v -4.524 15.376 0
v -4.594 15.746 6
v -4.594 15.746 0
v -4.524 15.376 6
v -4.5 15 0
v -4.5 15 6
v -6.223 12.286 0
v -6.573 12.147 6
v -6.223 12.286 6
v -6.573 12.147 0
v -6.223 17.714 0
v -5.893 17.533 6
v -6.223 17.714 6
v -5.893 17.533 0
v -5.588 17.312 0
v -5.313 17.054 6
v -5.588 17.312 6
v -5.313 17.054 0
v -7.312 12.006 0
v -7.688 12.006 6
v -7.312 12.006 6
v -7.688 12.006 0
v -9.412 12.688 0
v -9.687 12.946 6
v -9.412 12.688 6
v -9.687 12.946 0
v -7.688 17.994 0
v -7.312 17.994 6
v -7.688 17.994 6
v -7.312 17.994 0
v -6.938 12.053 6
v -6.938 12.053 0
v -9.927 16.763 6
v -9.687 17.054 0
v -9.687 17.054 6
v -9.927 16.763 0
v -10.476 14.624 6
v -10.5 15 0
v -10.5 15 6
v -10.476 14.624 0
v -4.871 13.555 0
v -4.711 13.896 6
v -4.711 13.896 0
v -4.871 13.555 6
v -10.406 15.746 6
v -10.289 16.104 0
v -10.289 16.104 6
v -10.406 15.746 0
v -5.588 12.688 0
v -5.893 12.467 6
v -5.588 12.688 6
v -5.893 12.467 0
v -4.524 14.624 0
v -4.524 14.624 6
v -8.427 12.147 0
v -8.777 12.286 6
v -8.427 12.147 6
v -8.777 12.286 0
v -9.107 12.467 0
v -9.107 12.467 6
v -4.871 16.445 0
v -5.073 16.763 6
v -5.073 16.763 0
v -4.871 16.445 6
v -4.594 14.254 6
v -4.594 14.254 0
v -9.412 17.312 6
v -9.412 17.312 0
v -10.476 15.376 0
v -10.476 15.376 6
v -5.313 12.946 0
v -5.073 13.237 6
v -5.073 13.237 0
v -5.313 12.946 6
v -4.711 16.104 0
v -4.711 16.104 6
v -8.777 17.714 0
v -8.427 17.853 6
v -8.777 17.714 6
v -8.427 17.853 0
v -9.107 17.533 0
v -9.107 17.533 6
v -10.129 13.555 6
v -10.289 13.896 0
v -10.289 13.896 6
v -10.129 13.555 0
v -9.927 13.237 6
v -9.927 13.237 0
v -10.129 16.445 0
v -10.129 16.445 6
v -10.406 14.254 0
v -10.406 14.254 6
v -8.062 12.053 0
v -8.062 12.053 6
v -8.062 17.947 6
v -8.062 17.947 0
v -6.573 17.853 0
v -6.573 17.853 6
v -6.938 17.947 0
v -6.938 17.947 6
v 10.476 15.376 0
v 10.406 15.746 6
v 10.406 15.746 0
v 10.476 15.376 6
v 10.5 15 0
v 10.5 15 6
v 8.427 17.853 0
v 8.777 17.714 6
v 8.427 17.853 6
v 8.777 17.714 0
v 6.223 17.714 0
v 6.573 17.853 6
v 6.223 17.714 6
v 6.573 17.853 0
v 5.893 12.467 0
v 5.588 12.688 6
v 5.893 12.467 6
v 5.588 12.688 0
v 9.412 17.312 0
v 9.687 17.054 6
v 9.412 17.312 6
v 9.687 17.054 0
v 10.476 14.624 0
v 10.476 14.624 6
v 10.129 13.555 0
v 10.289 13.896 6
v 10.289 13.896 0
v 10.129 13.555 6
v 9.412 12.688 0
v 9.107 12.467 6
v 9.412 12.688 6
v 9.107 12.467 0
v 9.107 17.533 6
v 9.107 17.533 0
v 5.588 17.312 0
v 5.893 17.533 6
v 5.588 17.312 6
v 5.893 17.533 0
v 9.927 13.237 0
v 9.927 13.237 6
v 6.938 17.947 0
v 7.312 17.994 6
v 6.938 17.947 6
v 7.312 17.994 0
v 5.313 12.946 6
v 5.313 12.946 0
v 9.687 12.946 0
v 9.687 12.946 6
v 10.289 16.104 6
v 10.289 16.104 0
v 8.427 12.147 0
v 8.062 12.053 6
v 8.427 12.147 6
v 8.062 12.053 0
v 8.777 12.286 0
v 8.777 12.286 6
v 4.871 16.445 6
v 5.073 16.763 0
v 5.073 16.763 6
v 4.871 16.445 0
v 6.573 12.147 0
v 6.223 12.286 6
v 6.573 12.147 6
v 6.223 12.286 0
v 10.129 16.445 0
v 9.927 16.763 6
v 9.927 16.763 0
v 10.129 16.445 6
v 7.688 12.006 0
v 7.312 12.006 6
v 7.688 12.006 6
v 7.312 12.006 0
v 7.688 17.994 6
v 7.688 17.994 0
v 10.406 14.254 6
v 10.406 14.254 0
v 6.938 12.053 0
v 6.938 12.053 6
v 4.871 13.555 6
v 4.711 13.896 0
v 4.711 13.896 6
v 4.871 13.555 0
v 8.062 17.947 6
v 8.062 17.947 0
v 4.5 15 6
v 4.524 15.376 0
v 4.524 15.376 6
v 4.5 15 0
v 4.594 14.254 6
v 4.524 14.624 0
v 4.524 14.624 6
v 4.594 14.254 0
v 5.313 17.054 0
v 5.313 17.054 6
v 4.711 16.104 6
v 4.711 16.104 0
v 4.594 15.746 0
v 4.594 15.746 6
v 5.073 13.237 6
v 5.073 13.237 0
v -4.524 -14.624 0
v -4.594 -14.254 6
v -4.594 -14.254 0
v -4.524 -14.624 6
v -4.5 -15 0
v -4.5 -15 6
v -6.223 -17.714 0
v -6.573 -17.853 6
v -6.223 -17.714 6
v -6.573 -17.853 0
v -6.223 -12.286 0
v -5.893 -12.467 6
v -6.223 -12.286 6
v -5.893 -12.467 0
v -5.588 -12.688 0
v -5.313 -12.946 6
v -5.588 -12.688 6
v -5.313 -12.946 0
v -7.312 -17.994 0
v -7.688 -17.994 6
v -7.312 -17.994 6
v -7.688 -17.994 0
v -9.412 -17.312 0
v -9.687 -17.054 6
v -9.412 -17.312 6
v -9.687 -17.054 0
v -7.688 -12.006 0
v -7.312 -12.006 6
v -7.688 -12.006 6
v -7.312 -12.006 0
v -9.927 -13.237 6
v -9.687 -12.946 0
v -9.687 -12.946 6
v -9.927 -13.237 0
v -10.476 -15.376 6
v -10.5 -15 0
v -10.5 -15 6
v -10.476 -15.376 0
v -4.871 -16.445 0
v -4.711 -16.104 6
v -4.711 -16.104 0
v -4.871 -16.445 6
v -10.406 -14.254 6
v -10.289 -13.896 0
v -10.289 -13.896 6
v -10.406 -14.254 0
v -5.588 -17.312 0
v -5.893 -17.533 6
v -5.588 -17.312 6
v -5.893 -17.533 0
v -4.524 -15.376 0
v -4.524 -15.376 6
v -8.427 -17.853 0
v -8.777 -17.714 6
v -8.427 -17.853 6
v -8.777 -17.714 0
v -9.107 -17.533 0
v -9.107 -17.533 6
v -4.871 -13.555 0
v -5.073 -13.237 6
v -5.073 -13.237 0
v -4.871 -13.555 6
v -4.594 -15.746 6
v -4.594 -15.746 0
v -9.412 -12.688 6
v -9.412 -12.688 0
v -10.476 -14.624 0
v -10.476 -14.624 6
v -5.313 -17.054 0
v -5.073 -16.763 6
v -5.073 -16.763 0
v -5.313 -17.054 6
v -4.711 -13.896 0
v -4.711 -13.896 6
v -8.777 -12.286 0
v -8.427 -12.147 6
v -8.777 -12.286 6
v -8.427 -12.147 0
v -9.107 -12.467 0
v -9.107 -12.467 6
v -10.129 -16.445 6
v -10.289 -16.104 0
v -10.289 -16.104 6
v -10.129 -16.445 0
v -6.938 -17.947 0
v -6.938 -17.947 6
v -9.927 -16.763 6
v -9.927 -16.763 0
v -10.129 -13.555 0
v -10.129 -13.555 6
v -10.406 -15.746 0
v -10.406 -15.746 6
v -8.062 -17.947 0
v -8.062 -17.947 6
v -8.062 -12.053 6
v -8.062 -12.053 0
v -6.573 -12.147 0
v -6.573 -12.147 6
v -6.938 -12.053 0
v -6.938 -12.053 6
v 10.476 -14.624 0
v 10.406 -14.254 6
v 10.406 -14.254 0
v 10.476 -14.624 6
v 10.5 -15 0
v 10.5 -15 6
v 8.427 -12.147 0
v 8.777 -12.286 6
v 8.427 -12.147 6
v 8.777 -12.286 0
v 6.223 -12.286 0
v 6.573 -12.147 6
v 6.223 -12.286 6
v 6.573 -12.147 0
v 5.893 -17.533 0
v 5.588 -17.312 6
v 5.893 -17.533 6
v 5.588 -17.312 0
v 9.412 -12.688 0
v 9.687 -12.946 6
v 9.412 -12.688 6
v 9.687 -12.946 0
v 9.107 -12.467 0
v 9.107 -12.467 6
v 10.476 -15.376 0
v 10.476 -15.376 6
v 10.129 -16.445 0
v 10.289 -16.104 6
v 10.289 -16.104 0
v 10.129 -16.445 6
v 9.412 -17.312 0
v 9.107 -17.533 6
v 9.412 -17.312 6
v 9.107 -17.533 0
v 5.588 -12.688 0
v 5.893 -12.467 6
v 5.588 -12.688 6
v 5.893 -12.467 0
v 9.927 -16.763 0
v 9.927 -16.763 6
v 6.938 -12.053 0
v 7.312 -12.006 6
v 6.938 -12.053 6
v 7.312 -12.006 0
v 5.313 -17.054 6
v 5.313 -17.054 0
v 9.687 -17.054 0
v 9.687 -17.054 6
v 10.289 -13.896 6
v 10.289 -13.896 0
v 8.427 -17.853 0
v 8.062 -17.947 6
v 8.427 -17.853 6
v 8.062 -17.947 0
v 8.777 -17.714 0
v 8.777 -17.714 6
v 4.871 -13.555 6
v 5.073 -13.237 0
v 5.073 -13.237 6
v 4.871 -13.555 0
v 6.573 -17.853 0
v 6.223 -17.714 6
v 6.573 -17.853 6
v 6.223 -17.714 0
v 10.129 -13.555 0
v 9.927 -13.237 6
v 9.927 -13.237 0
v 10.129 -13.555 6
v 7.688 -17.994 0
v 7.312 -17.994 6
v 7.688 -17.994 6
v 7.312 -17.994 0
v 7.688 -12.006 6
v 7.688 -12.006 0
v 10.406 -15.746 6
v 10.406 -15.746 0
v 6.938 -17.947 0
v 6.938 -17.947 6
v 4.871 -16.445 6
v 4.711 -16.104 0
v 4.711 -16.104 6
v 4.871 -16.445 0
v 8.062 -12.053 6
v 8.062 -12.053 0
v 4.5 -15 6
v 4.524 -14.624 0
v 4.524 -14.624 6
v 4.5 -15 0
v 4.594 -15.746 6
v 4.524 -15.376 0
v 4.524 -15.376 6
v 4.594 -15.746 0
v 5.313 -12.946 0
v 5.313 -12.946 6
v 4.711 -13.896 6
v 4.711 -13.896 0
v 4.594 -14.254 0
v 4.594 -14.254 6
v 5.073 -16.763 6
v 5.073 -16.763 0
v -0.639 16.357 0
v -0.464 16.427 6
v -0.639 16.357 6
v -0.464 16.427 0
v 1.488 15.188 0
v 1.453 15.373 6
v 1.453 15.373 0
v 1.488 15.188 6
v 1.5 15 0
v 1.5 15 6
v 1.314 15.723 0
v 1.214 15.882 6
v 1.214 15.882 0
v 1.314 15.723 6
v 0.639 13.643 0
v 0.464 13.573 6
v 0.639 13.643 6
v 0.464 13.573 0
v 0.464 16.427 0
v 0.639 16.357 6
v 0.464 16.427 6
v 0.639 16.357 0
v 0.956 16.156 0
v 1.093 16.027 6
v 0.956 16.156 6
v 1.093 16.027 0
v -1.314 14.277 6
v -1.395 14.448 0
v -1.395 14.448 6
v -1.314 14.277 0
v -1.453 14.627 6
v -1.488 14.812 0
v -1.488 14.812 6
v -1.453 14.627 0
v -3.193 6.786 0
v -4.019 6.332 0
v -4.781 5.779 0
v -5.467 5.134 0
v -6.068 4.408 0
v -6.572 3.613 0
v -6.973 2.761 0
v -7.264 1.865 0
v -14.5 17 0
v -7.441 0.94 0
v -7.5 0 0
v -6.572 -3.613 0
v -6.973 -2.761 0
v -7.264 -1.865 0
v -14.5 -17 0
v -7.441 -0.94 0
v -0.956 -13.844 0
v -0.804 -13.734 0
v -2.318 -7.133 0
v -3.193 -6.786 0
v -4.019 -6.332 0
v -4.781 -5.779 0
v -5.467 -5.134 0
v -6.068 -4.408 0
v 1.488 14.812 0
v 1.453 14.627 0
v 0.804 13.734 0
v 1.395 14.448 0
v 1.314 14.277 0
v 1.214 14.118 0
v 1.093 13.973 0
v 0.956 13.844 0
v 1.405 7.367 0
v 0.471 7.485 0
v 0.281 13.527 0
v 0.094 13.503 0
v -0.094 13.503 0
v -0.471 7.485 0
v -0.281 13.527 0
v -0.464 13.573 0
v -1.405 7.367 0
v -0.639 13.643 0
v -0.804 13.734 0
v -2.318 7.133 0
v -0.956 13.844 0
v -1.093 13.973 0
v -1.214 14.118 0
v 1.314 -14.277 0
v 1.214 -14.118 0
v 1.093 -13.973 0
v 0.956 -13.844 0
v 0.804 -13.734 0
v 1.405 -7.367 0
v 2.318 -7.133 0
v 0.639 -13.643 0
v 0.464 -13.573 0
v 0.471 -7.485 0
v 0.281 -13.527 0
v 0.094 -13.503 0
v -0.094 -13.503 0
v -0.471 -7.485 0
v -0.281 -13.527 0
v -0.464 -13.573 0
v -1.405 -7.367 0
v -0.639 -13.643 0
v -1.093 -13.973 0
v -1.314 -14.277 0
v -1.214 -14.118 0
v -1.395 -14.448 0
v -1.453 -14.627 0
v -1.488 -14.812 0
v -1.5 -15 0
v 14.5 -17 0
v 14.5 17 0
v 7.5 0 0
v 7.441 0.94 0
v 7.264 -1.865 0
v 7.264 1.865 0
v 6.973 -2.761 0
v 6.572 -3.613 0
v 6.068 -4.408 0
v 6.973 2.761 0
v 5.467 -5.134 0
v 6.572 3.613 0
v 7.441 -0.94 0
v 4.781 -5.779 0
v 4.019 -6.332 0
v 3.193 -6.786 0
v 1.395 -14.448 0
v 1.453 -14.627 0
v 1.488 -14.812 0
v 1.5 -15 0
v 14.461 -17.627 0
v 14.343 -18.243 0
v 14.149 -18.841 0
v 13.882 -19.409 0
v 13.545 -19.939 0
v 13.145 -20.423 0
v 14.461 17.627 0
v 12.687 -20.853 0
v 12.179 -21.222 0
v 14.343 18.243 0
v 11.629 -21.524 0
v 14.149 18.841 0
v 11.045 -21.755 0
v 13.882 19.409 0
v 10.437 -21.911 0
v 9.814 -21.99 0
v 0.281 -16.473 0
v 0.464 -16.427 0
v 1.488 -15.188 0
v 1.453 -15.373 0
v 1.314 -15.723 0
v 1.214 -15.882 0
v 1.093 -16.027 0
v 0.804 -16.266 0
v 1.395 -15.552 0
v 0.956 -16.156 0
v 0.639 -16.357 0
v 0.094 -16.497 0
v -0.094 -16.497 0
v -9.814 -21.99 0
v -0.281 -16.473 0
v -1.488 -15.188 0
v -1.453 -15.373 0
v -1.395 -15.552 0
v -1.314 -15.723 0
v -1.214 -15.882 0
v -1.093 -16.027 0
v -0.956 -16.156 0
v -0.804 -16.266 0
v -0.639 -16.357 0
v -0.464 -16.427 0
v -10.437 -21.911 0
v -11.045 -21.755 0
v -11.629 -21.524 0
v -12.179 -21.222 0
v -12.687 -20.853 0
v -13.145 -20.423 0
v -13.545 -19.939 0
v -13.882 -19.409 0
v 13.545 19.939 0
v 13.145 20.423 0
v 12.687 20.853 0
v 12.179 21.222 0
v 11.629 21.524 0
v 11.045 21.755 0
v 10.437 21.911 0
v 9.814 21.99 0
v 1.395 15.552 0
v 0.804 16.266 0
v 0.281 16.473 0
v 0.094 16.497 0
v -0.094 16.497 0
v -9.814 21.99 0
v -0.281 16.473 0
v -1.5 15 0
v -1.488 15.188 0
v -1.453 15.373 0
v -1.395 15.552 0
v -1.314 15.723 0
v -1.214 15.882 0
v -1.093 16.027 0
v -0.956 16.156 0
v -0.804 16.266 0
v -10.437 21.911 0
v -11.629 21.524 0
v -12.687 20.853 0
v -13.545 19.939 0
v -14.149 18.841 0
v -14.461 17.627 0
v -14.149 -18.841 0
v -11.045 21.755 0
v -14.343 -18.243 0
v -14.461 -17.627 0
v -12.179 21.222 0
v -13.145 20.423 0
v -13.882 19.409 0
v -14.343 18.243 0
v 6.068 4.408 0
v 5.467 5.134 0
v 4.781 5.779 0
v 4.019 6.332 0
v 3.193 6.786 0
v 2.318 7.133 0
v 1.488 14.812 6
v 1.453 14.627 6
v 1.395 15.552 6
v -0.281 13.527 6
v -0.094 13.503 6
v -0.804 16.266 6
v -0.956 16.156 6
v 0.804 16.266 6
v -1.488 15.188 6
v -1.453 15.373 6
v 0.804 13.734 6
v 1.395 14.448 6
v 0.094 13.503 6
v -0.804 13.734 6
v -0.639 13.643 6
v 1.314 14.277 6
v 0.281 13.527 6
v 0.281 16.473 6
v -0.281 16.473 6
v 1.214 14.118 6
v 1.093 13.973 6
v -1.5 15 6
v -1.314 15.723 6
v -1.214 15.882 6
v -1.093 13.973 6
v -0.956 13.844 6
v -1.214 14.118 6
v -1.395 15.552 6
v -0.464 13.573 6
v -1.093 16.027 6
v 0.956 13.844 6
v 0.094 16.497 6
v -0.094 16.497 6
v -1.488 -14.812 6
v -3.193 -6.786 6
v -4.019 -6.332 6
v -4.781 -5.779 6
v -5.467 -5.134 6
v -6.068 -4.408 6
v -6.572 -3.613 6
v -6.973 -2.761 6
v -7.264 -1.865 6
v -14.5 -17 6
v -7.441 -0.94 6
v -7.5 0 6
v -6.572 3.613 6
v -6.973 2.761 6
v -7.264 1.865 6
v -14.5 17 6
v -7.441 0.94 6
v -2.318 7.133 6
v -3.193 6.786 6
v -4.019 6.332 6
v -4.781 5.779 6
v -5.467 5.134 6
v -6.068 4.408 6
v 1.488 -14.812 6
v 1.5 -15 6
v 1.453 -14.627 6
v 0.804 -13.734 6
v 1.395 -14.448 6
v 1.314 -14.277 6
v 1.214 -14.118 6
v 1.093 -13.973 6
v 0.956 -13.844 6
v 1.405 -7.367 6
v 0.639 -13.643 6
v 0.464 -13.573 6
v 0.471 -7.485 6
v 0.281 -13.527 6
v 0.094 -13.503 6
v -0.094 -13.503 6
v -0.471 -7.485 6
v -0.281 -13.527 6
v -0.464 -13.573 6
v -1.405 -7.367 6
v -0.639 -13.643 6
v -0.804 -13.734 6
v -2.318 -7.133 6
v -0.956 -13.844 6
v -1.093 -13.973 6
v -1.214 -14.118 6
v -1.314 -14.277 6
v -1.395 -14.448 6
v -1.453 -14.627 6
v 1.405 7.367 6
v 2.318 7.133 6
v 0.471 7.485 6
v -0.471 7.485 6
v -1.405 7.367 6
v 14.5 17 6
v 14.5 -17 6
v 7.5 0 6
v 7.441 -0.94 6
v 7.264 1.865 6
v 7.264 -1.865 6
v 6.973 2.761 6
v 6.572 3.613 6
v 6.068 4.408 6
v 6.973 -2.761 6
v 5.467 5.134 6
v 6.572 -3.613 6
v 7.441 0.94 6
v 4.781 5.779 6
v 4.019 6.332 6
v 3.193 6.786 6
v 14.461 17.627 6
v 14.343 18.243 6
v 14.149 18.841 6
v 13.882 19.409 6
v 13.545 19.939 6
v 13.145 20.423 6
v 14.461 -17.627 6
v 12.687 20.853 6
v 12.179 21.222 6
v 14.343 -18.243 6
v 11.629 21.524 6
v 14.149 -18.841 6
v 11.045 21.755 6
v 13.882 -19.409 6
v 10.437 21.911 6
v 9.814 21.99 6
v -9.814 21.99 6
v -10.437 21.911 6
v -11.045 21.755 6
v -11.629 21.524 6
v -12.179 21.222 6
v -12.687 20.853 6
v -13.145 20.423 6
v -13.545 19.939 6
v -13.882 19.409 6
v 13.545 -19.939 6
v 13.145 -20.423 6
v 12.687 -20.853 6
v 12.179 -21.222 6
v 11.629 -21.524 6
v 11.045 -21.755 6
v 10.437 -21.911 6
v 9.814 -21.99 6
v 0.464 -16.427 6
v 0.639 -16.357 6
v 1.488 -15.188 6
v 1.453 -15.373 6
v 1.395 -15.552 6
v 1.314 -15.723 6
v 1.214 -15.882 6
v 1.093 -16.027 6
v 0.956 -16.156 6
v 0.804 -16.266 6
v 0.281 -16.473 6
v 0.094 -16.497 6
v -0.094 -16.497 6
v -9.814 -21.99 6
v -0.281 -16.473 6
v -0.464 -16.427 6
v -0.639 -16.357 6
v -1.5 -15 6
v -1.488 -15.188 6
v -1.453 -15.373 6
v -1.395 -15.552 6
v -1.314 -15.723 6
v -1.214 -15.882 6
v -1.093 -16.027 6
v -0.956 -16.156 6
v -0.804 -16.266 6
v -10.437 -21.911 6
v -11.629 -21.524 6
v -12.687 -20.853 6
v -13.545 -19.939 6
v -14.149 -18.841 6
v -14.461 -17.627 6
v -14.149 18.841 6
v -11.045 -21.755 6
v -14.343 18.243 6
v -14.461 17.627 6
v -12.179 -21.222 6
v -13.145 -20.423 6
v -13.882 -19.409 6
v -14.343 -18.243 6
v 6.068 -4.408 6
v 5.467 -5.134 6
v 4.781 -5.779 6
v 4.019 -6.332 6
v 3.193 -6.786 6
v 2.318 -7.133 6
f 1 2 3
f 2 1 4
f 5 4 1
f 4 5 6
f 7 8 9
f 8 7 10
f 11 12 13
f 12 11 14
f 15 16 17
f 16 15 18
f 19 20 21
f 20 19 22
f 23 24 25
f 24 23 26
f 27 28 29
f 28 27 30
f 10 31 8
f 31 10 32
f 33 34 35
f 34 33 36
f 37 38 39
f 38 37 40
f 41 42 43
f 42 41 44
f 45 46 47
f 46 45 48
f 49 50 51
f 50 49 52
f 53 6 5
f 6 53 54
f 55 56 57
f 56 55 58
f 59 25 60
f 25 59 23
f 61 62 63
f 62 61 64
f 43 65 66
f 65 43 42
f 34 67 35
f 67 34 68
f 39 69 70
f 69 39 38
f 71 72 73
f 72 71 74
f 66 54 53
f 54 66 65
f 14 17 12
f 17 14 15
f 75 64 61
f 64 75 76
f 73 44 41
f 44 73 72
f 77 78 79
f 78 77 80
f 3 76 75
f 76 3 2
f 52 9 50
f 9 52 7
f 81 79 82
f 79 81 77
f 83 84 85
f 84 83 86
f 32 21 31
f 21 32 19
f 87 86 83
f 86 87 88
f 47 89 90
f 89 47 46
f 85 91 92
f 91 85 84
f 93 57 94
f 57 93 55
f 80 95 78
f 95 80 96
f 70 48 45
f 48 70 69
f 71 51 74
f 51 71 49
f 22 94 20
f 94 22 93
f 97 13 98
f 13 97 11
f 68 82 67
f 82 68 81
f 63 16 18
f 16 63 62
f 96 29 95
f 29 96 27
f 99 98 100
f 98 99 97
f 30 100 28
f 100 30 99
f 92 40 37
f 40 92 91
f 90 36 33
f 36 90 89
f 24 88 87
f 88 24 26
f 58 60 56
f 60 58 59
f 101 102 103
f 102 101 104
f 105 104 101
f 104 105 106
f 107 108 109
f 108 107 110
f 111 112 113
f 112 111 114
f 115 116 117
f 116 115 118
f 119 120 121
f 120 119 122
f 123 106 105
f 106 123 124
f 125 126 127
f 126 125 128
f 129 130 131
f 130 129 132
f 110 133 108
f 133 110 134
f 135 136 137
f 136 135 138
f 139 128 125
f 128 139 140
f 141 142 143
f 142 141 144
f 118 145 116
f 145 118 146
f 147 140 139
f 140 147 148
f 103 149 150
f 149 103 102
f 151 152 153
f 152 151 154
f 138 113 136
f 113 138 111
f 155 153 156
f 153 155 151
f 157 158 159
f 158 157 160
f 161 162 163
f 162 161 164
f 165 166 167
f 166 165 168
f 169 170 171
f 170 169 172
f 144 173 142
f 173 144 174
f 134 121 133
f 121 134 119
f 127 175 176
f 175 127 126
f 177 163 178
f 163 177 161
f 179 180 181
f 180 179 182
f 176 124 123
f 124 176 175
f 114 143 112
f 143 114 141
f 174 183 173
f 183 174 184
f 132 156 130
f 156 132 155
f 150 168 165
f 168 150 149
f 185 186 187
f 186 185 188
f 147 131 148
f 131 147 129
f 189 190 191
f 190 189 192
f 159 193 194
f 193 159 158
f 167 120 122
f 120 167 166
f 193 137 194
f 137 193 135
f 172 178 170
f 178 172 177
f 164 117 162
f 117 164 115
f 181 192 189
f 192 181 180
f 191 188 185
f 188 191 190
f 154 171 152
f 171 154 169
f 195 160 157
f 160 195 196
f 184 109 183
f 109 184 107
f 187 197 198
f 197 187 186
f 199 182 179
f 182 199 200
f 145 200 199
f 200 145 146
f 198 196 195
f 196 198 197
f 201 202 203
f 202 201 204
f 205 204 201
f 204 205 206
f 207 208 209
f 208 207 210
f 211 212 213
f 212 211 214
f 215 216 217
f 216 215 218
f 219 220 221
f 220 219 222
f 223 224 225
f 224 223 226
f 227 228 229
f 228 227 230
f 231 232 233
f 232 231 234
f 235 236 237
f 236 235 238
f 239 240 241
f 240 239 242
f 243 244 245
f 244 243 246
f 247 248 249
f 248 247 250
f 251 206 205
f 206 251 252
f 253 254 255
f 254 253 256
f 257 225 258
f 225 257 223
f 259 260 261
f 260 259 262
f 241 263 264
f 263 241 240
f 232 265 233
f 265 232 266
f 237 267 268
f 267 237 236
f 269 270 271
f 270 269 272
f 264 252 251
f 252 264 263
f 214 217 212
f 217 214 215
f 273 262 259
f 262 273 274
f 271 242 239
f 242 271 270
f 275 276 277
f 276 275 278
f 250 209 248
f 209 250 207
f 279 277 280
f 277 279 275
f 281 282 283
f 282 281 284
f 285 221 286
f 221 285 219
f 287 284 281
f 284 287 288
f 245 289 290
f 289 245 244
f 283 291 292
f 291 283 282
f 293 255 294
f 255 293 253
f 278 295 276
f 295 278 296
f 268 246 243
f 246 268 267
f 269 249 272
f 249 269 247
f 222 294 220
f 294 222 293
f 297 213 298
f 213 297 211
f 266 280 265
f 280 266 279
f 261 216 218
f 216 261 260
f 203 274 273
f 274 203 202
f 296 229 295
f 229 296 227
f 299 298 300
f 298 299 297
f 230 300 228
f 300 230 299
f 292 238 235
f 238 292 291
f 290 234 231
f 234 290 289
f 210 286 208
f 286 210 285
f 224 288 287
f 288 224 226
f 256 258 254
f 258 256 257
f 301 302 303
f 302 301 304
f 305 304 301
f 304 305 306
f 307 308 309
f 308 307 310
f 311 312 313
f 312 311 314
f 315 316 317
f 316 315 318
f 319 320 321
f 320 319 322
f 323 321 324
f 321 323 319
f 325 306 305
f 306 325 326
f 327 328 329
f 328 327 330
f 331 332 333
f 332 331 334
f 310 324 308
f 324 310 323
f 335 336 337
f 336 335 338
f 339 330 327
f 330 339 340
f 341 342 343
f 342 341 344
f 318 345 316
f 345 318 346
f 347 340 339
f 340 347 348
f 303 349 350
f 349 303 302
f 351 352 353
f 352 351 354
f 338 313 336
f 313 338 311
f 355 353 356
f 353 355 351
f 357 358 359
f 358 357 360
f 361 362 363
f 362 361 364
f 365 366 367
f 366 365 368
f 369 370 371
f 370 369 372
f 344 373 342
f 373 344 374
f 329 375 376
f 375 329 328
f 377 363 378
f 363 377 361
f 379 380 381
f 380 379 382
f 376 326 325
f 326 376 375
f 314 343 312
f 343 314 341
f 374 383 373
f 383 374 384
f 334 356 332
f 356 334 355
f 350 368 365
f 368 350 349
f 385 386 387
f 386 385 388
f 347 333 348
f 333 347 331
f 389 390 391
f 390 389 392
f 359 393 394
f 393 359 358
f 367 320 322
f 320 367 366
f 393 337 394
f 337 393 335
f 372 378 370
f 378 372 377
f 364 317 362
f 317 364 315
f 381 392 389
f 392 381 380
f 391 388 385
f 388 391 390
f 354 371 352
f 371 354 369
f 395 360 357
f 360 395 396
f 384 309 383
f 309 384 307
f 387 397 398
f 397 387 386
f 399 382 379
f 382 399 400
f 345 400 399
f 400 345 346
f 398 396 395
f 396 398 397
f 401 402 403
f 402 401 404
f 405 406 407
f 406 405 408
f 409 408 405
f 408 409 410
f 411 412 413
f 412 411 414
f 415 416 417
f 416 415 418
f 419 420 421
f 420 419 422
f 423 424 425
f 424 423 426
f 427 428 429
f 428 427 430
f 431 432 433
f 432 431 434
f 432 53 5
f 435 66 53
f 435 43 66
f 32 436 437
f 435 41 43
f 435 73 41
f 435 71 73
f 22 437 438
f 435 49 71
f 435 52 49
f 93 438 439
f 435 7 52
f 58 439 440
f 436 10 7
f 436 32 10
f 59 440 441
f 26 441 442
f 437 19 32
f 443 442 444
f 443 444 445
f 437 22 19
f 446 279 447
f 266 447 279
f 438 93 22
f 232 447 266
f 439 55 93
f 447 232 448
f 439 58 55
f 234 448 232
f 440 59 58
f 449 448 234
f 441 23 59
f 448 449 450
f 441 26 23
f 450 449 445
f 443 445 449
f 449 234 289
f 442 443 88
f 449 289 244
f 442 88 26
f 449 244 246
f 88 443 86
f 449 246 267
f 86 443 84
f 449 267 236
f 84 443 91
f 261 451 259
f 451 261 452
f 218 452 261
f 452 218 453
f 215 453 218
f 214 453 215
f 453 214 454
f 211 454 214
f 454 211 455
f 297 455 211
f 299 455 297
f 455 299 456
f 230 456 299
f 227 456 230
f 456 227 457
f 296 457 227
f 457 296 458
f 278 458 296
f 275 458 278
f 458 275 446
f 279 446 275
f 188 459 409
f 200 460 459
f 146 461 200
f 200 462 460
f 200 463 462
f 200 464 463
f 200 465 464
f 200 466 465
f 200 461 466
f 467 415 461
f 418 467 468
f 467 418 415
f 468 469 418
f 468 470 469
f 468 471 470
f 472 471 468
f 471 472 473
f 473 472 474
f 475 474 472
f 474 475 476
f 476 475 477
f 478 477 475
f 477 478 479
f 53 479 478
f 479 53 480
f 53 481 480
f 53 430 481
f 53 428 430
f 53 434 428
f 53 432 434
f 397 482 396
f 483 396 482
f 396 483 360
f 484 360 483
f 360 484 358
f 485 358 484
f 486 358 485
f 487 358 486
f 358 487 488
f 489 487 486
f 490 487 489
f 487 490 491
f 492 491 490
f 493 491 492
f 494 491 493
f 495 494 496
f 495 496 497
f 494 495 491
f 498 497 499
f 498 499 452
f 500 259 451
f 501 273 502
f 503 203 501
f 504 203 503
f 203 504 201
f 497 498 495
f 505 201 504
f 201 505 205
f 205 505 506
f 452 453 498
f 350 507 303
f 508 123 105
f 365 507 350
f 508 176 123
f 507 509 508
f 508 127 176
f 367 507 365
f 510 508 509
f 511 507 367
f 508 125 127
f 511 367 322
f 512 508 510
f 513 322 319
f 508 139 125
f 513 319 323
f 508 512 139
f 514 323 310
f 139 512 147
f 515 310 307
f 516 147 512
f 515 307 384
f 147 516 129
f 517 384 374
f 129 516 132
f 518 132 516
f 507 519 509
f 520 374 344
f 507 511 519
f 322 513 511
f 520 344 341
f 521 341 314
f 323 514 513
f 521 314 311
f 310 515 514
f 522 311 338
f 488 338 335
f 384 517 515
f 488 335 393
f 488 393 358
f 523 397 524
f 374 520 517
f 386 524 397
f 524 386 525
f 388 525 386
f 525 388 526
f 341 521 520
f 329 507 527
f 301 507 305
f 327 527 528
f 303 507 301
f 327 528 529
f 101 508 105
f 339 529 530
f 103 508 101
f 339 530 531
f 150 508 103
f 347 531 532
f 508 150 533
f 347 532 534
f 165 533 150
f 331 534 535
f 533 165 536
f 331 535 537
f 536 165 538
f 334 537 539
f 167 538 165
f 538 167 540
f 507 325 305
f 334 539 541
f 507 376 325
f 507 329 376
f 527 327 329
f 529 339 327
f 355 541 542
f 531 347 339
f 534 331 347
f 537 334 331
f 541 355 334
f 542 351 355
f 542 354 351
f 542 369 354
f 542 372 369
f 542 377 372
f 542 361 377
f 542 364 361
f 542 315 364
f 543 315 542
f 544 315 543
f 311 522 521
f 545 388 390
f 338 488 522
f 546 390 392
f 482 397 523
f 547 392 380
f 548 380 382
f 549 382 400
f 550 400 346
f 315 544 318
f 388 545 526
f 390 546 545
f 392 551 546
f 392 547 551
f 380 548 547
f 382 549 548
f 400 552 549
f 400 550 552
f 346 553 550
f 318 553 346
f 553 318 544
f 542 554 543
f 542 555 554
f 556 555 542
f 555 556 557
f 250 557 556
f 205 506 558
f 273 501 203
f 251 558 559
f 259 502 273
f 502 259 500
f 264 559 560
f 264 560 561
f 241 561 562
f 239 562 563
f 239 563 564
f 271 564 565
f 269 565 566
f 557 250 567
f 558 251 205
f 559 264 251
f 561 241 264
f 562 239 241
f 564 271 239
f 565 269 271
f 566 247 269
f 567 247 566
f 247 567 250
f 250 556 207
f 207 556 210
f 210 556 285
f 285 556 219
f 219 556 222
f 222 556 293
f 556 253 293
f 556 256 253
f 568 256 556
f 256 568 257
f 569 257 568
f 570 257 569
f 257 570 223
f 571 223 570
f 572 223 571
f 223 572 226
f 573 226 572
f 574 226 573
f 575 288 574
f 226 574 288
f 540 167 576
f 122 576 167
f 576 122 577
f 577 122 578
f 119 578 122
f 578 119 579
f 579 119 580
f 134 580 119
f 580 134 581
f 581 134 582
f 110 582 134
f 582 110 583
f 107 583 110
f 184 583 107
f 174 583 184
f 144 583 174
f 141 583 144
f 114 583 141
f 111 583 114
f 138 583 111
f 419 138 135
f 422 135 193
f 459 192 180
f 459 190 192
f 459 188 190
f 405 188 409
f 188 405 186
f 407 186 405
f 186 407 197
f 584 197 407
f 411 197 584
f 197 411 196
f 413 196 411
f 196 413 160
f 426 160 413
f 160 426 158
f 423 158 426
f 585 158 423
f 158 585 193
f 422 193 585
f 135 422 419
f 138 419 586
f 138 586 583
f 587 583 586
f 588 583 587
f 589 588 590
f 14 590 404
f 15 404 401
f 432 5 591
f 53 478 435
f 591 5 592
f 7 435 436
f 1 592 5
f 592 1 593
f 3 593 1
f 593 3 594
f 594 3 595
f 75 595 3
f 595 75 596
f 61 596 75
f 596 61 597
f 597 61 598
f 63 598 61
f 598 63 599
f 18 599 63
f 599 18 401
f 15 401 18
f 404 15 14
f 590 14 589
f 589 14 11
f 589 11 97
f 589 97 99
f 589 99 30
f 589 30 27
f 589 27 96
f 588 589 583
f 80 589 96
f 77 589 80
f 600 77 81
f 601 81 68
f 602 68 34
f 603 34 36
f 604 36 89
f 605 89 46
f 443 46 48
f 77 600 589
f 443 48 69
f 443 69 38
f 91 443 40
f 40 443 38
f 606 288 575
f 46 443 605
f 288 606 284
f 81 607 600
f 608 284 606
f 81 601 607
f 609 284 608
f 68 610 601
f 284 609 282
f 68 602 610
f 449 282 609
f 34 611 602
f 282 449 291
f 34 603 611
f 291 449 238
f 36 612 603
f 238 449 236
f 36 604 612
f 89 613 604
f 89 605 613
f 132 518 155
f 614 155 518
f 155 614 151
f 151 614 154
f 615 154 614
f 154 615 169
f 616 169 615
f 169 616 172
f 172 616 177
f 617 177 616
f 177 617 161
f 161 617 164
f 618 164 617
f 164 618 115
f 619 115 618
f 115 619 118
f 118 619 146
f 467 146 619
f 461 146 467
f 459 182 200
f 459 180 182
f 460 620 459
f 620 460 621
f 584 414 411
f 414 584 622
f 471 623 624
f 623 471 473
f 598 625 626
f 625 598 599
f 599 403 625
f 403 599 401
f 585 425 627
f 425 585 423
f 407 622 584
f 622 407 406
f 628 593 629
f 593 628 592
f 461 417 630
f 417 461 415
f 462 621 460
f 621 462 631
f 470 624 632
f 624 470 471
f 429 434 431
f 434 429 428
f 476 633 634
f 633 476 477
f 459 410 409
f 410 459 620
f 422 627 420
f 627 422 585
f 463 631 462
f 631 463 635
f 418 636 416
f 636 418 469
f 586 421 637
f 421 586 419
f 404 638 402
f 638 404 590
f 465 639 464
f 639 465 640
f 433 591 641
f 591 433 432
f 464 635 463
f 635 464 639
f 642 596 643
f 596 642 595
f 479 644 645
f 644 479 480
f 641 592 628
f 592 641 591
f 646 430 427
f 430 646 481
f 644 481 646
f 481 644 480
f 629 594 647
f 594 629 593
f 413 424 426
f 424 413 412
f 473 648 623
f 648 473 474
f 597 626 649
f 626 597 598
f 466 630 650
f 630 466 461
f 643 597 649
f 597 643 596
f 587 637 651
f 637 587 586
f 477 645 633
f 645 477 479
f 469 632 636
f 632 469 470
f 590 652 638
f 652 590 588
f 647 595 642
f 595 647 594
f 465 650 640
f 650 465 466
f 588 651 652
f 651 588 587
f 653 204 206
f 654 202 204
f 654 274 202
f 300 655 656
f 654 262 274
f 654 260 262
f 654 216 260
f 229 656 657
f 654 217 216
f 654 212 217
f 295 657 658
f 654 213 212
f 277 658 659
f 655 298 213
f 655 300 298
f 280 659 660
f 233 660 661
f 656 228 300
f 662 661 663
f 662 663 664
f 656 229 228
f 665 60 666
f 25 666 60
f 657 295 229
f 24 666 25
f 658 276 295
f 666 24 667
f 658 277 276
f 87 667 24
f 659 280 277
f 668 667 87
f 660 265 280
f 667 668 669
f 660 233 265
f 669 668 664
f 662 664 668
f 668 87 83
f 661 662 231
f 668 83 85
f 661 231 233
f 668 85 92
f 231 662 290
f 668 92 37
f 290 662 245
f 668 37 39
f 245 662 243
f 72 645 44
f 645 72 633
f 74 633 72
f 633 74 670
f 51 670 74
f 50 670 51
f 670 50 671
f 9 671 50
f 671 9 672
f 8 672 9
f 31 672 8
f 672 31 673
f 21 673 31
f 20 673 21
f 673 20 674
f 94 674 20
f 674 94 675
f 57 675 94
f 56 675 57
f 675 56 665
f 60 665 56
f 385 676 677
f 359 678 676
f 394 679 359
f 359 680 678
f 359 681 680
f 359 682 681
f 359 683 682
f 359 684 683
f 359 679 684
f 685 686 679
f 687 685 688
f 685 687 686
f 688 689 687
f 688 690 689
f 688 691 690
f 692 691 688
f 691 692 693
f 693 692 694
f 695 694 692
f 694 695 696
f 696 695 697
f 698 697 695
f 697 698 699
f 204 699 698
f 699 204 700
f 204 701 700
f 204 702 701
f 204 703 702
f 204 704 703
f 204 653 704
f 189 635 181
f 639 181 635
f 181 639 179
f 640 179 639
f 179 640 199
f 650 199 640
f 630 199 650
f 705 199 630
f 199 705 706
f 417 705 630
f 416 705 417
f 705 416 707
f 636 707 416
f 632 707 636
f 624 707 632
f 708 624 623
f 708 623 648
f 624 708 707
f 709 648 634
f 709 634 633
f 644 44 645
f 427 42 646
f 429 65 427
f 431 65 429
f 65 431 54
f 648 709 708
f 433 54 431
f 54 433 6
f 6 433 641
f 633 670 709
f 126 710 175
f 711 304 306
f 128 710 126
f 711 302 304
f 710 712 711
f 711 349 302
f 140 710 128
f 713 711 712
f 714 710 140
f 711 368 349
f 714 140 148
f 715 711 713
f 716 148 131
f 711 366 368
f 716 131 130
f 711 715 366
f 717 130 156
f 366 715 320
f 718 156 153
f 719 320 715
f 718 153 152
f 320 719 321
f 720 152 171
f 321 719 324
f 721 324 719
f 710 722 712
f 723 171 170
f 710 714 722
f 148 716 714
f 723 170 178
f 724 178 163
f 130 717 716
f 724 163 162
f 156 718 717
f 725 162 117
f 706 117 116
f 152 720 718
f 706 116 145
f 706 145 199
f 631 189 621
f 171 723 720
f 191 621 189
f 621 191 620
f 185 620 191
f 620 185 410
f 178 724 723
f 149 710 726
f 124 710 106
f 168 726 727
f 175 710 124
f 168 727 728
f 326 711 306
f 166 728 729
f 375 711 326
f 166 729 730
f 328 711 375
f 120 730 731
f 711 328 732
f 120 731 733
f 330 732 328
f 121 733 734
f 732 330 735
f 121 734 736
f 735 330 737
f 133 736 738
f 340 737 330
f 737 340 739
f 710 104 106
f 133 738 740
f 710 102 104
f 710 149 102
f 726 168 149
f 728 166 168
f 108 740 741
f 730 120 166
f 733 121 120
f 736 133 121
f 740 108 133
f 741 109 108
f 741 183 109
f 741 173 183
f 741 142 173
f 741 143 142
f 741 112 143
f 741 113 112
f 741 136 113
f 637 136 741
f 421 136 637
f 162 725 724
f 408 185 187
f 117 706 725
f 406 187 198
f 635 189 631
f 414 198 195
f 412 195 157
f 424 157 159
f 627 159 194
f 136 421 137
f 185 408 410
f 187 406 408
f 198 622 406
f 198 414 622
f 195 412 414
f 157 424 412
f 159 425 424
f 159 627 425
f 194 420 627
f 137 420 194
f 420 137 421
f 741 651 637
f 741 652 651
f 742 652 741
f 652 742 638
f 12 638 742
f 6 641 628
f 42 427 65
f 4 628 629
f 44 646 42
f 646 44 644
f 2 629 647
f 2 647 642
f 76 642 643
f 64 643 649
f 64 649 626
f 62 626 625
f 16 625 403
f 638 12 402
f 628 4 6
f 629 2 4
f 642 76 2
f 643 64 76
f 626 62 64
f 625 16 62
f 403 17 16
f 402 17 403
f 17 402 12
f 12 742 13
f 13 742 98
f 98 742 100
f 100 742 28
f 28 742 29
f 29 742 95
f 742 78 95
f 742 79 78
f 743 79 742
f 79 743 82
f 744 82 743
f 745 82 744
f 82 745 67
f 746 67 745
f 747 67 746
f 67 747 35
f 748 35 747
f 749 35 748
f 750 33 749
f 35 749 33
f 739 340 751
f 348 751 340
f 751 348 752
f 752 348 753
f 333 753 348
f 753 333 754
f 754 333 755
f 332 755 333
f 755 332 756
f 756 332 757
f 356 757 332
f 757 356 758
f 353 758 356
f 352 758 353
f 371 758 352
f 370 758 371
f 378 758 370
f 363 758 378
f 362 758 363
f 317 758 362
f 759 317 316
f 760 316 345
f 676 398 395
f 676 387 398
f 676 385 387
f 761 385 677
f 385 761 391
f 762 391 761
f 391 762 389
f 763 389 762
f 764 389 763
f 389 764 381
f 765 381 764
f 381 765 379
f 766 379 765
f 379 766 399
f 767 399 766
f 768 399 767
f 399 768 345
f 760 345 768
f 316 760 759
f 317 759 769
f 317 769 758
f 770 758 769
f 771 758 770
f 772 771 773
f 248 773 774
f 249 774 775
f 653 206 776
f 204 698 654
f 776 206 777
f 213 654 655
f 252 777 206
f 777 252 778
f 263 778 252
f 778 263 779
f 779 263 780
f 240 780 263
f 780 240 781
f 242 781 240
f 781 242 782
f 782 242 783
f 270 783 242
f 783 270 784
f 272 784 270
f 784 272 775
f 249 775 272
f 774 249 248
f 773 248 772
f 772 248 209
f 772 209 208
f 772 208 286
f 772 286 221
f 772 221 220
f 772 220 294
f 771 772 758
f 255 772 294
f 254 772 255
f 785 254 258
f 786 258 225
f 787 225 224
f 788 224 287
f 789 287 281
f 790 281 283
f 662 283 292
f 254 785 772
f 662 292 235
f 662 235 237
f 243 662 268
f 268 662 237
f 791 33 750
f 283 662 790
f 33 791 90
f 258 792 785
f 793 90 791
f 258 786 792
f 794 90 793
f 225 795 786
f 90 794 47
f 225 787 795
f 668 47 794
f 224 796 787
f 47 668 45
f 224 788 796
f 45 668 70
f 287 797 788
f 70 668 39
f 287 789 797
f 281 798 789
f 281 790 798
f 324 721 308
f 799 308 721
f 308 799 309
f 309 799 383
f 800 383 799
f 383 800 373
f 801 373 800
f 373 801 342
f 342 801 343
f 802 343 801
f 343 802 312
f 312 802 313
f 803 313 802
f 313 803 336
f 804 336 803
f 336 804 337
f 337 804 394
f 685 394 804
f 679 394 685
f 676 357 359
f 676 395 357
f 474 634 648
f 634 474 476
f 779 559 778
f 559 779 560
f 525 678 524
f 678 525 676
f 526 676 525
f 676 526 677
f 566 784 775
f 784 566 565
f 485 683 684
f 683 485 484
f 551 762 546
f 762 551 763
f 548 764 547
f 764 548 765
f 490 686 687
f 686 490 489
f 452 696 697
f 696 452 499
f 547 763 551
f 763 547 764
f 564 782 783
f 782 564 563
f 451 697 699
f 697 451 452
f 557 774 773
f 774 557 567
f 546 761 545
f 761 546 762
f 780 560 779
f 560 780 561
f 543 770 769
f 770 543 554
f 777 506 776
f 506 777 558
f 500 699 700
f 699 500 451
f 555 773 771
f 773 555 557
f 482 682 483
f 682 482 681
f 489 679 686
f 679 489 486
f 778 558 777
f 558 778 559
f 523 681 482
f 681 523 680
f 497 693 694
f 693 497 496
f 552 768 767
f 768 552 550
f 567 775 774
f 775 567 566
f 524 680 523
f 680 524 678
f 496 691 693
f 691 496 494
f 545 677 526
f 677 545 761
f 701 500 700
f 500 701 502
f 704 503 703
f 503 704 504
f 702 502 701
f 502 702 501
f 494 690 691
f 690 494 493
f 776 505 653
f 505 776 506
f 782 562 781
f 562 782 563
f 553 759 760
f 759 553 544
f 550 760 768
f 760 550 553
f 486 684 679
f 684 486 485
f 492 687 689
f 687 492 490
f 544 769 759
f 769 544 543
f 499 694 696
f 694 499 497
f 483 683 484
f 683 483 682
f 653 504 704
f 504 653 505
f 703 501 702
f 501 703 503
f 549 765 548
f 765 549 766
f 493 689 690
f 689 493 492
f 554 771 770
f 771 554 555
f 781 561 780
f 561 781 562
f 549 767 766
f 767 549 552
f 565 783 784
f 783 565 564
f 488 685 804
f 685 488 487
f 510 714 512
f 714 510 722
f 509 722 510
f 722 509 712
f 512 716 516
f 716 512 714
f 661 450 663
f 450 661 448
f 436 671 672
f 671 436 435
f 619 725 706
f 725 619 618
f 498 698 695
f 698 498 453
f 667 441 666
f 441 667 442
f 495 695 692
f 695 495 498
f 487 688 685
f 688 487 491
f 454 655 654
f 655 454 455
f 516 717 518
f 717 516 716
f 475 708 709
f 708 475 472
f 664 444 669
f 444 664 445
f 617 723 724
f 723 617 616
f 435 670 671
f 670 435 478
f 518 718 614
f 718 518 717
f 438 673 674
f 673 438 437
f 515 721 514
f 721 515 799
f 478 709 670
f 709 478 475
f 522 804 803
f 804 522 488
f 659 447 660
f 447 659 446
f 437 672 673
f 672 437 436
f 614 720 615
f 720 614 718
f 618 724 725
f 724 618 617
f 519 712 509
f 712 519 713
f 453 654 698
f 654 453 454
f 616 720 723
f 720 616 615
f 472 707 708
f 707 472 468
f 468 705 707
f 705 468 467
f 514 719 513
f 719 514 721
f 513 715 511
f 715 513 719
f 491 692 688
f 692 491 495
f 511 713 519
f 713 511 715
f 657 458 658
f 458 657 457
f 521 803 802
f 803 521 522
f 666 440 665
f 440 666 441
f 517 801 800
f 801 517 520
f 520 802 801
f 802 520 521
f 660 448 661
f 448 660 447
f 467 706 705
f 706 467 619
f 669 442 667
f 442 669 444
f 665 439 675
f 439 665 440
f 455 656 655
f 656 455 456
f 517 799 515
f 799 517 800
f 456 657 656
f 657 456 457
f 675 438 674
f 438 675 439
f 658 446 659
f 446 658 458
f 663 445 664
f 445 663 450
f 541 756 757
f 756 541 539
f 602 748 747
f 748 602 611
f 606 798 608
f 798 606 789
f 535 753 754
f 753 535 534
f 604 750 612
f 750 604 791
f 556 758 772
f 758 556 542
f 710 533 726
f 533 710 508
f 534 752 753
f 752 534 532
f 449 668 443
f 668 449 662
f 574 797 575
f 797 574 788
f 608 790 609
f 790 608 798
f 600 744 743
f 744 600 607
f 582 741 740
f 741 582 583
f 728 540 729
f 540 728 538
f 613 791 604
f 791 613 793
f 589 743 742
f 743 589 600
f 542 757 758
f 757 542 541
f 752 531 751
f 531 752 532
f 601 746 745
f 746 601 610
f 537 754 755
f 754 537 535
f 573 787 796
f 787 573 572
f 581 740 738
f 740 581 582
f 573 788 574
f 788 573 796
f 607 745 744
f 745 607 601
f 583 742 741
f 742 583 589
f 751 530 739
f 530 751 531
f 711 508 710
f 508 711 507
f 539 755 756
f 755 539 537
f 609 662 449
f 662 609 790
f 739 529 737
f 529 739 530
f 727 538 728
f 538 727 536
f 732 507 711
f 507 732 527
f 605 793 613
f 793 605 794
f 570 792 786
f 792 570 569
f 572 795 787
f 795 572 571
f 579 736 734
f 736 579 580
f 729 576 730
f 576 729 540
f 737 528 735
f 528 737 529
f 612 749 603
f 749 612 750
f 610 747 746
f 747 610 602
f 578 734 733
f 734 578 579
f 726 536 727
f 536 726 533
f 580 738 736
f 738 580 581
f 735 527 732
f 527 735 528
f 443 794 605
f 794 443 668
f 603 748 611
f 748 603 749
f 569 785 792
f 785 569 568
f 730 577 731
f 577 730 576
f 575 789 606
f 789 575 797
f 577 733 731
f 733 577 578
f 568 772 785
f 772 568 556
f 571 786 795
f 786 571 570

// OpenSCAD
$fn = 50;


difference() {
	union() {
		hull() {
			translate(v = [-9.5000000000, 17.0000000000, 0]) {
				cylinder(h = 6, r = 5);
			}
			translate(v = [9.5000000000, 17.0000000000, 0]) {
				cylinder(h = 6, r = 5);
			}
			translate(v = [-9.5000000000, -17.0000000000, 0]) {
				cylinder(h = 6, r = 5);
			}
			translate(v = [9.5000000000, -17.0000000000, 0]) {
				cylinder(h = 6, r = 5);
			}
		}
	}
	union() {
		#translate(v = [-7.5000000000, 15.0000000000, 0]) {
			cylinder(h = 6, r = 3.0000000000);
		}
		#translate(v = [7.5000000000, 15.0000000000, 0]) {
			cylinder(h = 6, r = 3.0000000000);
		}
		#translate(v = [-7.5000000000, -15.0000000000, 0]) {
			cylinder(h = 6, r = 3.0000000000);
		}
		#translate(v = [7.5000000000, -15.0000000000, 0]) {
			cylinder(h = 6, r = 3.0000000000);
		}
		#translate(v = [-7.5000000000, -15.0000000000, -100.0000000000]) {
			cylinder(h = 200, r = 3.0000000000);
		}
		#translate(v = [-7.5000000000, 15.0000000000, -100.0000000000]) {
			cylinder(h = 200, r = 3.0000000000);
		}
		#translate(v = [7.5000000000, -15.0000000000, -100.0000000000]) {
			cylinder(h = 200, r = 3.0000000000);
		}
		#translate(v = [7.5000000000, 15.0000000000, -100.0000000000]) {
			cylinder(h = 200, r = 3.0000000000);
		}
		#translate(v = [-7.5000000000, 15.0000000000, 0]) {
			cylinder(h = 6, r = 1.5000000000);
		}
		#translate(v = [0.0000000000, 15.0000000000, 0]) {
			cylinder(h = 6, r = 1.5000000000);
		}
		#translate(v = [7.5000000000, 15.0000000000, 0]) {
			cylinder(h = 6, r = 1.5000000000);
		}
		#translate(v = [-7.5000000000, -15.0000000000, 0]) {
			cylinder(h = 6, r = 1.5000000000);
		}
		#translate(v = [0.0000000000, -15.0000000000, 0]) {
			cylinder(h = 6, r = 1.5000000000);
		}
		#translate(v = [7.5000000000, -15.0000000000, 0]) {
			cylinder(h = 6, r = 1.5000000000);
		}
		#translate(v = [-7.5000000000, 15.0000000000, 0]) {
			cylinder(h = 6, r = 1.5000000000);
		}
		#translate(v = [0.0000000000, 15.0000000000, 0]) {
			cylinder(h = 6, r = 1.5000000000);
		}
		#translate(v = [7.5000000000, 15.0000000000, 0]) {
			cylinder(h = 6, r = 1.5000000000);
		}
		#translate(v = [-7.5000000000, -15.0000000000, 0]) {
			cylinder(h = 6, r = 1.5000000000);
		}
		#translate(v = [0.0000000000, -15.0000000000, 0]) {
			cylinder(h = 6, r = 1.5000000000);
		}
		#translate(v = [7.5000000000, -15.0000000000, 0]) {
			cylinder(h = 6, r = 1.5000000000);
		}
		#translate(v = [-7.5000000000, 15.0000000000, 0]) {
			cylinder(h = 6, r = 1.5000000000);
		}
		#translate(v = [0.0000000000, 15.0000000000, 0]) {
			cylinder(h = 6, r = 1.5000000000);
		}
		#translate(v = [7.5000000000, 15.0000000000, 0]) {
			cylinder(h = 6, r = 1.5000000000);
		}
		#translate(v = [-7.5000000000, -15.0000000000, 0]) {
			cylinder(h = 6, r = 1.5000000000);
		}
		#translate(v = [0.0000000000, -15.0000000000, 0]) {
			cylinder(h = 6, r = 1.5000000000);
		}
		#translate(v = [7.5000000000, -15.0000000000, 0]) {
			cylinder(h = 6, r = 1.5000000000);
		}
		#cylinder(h = 6, r = 7.5000000000);
	}
}
